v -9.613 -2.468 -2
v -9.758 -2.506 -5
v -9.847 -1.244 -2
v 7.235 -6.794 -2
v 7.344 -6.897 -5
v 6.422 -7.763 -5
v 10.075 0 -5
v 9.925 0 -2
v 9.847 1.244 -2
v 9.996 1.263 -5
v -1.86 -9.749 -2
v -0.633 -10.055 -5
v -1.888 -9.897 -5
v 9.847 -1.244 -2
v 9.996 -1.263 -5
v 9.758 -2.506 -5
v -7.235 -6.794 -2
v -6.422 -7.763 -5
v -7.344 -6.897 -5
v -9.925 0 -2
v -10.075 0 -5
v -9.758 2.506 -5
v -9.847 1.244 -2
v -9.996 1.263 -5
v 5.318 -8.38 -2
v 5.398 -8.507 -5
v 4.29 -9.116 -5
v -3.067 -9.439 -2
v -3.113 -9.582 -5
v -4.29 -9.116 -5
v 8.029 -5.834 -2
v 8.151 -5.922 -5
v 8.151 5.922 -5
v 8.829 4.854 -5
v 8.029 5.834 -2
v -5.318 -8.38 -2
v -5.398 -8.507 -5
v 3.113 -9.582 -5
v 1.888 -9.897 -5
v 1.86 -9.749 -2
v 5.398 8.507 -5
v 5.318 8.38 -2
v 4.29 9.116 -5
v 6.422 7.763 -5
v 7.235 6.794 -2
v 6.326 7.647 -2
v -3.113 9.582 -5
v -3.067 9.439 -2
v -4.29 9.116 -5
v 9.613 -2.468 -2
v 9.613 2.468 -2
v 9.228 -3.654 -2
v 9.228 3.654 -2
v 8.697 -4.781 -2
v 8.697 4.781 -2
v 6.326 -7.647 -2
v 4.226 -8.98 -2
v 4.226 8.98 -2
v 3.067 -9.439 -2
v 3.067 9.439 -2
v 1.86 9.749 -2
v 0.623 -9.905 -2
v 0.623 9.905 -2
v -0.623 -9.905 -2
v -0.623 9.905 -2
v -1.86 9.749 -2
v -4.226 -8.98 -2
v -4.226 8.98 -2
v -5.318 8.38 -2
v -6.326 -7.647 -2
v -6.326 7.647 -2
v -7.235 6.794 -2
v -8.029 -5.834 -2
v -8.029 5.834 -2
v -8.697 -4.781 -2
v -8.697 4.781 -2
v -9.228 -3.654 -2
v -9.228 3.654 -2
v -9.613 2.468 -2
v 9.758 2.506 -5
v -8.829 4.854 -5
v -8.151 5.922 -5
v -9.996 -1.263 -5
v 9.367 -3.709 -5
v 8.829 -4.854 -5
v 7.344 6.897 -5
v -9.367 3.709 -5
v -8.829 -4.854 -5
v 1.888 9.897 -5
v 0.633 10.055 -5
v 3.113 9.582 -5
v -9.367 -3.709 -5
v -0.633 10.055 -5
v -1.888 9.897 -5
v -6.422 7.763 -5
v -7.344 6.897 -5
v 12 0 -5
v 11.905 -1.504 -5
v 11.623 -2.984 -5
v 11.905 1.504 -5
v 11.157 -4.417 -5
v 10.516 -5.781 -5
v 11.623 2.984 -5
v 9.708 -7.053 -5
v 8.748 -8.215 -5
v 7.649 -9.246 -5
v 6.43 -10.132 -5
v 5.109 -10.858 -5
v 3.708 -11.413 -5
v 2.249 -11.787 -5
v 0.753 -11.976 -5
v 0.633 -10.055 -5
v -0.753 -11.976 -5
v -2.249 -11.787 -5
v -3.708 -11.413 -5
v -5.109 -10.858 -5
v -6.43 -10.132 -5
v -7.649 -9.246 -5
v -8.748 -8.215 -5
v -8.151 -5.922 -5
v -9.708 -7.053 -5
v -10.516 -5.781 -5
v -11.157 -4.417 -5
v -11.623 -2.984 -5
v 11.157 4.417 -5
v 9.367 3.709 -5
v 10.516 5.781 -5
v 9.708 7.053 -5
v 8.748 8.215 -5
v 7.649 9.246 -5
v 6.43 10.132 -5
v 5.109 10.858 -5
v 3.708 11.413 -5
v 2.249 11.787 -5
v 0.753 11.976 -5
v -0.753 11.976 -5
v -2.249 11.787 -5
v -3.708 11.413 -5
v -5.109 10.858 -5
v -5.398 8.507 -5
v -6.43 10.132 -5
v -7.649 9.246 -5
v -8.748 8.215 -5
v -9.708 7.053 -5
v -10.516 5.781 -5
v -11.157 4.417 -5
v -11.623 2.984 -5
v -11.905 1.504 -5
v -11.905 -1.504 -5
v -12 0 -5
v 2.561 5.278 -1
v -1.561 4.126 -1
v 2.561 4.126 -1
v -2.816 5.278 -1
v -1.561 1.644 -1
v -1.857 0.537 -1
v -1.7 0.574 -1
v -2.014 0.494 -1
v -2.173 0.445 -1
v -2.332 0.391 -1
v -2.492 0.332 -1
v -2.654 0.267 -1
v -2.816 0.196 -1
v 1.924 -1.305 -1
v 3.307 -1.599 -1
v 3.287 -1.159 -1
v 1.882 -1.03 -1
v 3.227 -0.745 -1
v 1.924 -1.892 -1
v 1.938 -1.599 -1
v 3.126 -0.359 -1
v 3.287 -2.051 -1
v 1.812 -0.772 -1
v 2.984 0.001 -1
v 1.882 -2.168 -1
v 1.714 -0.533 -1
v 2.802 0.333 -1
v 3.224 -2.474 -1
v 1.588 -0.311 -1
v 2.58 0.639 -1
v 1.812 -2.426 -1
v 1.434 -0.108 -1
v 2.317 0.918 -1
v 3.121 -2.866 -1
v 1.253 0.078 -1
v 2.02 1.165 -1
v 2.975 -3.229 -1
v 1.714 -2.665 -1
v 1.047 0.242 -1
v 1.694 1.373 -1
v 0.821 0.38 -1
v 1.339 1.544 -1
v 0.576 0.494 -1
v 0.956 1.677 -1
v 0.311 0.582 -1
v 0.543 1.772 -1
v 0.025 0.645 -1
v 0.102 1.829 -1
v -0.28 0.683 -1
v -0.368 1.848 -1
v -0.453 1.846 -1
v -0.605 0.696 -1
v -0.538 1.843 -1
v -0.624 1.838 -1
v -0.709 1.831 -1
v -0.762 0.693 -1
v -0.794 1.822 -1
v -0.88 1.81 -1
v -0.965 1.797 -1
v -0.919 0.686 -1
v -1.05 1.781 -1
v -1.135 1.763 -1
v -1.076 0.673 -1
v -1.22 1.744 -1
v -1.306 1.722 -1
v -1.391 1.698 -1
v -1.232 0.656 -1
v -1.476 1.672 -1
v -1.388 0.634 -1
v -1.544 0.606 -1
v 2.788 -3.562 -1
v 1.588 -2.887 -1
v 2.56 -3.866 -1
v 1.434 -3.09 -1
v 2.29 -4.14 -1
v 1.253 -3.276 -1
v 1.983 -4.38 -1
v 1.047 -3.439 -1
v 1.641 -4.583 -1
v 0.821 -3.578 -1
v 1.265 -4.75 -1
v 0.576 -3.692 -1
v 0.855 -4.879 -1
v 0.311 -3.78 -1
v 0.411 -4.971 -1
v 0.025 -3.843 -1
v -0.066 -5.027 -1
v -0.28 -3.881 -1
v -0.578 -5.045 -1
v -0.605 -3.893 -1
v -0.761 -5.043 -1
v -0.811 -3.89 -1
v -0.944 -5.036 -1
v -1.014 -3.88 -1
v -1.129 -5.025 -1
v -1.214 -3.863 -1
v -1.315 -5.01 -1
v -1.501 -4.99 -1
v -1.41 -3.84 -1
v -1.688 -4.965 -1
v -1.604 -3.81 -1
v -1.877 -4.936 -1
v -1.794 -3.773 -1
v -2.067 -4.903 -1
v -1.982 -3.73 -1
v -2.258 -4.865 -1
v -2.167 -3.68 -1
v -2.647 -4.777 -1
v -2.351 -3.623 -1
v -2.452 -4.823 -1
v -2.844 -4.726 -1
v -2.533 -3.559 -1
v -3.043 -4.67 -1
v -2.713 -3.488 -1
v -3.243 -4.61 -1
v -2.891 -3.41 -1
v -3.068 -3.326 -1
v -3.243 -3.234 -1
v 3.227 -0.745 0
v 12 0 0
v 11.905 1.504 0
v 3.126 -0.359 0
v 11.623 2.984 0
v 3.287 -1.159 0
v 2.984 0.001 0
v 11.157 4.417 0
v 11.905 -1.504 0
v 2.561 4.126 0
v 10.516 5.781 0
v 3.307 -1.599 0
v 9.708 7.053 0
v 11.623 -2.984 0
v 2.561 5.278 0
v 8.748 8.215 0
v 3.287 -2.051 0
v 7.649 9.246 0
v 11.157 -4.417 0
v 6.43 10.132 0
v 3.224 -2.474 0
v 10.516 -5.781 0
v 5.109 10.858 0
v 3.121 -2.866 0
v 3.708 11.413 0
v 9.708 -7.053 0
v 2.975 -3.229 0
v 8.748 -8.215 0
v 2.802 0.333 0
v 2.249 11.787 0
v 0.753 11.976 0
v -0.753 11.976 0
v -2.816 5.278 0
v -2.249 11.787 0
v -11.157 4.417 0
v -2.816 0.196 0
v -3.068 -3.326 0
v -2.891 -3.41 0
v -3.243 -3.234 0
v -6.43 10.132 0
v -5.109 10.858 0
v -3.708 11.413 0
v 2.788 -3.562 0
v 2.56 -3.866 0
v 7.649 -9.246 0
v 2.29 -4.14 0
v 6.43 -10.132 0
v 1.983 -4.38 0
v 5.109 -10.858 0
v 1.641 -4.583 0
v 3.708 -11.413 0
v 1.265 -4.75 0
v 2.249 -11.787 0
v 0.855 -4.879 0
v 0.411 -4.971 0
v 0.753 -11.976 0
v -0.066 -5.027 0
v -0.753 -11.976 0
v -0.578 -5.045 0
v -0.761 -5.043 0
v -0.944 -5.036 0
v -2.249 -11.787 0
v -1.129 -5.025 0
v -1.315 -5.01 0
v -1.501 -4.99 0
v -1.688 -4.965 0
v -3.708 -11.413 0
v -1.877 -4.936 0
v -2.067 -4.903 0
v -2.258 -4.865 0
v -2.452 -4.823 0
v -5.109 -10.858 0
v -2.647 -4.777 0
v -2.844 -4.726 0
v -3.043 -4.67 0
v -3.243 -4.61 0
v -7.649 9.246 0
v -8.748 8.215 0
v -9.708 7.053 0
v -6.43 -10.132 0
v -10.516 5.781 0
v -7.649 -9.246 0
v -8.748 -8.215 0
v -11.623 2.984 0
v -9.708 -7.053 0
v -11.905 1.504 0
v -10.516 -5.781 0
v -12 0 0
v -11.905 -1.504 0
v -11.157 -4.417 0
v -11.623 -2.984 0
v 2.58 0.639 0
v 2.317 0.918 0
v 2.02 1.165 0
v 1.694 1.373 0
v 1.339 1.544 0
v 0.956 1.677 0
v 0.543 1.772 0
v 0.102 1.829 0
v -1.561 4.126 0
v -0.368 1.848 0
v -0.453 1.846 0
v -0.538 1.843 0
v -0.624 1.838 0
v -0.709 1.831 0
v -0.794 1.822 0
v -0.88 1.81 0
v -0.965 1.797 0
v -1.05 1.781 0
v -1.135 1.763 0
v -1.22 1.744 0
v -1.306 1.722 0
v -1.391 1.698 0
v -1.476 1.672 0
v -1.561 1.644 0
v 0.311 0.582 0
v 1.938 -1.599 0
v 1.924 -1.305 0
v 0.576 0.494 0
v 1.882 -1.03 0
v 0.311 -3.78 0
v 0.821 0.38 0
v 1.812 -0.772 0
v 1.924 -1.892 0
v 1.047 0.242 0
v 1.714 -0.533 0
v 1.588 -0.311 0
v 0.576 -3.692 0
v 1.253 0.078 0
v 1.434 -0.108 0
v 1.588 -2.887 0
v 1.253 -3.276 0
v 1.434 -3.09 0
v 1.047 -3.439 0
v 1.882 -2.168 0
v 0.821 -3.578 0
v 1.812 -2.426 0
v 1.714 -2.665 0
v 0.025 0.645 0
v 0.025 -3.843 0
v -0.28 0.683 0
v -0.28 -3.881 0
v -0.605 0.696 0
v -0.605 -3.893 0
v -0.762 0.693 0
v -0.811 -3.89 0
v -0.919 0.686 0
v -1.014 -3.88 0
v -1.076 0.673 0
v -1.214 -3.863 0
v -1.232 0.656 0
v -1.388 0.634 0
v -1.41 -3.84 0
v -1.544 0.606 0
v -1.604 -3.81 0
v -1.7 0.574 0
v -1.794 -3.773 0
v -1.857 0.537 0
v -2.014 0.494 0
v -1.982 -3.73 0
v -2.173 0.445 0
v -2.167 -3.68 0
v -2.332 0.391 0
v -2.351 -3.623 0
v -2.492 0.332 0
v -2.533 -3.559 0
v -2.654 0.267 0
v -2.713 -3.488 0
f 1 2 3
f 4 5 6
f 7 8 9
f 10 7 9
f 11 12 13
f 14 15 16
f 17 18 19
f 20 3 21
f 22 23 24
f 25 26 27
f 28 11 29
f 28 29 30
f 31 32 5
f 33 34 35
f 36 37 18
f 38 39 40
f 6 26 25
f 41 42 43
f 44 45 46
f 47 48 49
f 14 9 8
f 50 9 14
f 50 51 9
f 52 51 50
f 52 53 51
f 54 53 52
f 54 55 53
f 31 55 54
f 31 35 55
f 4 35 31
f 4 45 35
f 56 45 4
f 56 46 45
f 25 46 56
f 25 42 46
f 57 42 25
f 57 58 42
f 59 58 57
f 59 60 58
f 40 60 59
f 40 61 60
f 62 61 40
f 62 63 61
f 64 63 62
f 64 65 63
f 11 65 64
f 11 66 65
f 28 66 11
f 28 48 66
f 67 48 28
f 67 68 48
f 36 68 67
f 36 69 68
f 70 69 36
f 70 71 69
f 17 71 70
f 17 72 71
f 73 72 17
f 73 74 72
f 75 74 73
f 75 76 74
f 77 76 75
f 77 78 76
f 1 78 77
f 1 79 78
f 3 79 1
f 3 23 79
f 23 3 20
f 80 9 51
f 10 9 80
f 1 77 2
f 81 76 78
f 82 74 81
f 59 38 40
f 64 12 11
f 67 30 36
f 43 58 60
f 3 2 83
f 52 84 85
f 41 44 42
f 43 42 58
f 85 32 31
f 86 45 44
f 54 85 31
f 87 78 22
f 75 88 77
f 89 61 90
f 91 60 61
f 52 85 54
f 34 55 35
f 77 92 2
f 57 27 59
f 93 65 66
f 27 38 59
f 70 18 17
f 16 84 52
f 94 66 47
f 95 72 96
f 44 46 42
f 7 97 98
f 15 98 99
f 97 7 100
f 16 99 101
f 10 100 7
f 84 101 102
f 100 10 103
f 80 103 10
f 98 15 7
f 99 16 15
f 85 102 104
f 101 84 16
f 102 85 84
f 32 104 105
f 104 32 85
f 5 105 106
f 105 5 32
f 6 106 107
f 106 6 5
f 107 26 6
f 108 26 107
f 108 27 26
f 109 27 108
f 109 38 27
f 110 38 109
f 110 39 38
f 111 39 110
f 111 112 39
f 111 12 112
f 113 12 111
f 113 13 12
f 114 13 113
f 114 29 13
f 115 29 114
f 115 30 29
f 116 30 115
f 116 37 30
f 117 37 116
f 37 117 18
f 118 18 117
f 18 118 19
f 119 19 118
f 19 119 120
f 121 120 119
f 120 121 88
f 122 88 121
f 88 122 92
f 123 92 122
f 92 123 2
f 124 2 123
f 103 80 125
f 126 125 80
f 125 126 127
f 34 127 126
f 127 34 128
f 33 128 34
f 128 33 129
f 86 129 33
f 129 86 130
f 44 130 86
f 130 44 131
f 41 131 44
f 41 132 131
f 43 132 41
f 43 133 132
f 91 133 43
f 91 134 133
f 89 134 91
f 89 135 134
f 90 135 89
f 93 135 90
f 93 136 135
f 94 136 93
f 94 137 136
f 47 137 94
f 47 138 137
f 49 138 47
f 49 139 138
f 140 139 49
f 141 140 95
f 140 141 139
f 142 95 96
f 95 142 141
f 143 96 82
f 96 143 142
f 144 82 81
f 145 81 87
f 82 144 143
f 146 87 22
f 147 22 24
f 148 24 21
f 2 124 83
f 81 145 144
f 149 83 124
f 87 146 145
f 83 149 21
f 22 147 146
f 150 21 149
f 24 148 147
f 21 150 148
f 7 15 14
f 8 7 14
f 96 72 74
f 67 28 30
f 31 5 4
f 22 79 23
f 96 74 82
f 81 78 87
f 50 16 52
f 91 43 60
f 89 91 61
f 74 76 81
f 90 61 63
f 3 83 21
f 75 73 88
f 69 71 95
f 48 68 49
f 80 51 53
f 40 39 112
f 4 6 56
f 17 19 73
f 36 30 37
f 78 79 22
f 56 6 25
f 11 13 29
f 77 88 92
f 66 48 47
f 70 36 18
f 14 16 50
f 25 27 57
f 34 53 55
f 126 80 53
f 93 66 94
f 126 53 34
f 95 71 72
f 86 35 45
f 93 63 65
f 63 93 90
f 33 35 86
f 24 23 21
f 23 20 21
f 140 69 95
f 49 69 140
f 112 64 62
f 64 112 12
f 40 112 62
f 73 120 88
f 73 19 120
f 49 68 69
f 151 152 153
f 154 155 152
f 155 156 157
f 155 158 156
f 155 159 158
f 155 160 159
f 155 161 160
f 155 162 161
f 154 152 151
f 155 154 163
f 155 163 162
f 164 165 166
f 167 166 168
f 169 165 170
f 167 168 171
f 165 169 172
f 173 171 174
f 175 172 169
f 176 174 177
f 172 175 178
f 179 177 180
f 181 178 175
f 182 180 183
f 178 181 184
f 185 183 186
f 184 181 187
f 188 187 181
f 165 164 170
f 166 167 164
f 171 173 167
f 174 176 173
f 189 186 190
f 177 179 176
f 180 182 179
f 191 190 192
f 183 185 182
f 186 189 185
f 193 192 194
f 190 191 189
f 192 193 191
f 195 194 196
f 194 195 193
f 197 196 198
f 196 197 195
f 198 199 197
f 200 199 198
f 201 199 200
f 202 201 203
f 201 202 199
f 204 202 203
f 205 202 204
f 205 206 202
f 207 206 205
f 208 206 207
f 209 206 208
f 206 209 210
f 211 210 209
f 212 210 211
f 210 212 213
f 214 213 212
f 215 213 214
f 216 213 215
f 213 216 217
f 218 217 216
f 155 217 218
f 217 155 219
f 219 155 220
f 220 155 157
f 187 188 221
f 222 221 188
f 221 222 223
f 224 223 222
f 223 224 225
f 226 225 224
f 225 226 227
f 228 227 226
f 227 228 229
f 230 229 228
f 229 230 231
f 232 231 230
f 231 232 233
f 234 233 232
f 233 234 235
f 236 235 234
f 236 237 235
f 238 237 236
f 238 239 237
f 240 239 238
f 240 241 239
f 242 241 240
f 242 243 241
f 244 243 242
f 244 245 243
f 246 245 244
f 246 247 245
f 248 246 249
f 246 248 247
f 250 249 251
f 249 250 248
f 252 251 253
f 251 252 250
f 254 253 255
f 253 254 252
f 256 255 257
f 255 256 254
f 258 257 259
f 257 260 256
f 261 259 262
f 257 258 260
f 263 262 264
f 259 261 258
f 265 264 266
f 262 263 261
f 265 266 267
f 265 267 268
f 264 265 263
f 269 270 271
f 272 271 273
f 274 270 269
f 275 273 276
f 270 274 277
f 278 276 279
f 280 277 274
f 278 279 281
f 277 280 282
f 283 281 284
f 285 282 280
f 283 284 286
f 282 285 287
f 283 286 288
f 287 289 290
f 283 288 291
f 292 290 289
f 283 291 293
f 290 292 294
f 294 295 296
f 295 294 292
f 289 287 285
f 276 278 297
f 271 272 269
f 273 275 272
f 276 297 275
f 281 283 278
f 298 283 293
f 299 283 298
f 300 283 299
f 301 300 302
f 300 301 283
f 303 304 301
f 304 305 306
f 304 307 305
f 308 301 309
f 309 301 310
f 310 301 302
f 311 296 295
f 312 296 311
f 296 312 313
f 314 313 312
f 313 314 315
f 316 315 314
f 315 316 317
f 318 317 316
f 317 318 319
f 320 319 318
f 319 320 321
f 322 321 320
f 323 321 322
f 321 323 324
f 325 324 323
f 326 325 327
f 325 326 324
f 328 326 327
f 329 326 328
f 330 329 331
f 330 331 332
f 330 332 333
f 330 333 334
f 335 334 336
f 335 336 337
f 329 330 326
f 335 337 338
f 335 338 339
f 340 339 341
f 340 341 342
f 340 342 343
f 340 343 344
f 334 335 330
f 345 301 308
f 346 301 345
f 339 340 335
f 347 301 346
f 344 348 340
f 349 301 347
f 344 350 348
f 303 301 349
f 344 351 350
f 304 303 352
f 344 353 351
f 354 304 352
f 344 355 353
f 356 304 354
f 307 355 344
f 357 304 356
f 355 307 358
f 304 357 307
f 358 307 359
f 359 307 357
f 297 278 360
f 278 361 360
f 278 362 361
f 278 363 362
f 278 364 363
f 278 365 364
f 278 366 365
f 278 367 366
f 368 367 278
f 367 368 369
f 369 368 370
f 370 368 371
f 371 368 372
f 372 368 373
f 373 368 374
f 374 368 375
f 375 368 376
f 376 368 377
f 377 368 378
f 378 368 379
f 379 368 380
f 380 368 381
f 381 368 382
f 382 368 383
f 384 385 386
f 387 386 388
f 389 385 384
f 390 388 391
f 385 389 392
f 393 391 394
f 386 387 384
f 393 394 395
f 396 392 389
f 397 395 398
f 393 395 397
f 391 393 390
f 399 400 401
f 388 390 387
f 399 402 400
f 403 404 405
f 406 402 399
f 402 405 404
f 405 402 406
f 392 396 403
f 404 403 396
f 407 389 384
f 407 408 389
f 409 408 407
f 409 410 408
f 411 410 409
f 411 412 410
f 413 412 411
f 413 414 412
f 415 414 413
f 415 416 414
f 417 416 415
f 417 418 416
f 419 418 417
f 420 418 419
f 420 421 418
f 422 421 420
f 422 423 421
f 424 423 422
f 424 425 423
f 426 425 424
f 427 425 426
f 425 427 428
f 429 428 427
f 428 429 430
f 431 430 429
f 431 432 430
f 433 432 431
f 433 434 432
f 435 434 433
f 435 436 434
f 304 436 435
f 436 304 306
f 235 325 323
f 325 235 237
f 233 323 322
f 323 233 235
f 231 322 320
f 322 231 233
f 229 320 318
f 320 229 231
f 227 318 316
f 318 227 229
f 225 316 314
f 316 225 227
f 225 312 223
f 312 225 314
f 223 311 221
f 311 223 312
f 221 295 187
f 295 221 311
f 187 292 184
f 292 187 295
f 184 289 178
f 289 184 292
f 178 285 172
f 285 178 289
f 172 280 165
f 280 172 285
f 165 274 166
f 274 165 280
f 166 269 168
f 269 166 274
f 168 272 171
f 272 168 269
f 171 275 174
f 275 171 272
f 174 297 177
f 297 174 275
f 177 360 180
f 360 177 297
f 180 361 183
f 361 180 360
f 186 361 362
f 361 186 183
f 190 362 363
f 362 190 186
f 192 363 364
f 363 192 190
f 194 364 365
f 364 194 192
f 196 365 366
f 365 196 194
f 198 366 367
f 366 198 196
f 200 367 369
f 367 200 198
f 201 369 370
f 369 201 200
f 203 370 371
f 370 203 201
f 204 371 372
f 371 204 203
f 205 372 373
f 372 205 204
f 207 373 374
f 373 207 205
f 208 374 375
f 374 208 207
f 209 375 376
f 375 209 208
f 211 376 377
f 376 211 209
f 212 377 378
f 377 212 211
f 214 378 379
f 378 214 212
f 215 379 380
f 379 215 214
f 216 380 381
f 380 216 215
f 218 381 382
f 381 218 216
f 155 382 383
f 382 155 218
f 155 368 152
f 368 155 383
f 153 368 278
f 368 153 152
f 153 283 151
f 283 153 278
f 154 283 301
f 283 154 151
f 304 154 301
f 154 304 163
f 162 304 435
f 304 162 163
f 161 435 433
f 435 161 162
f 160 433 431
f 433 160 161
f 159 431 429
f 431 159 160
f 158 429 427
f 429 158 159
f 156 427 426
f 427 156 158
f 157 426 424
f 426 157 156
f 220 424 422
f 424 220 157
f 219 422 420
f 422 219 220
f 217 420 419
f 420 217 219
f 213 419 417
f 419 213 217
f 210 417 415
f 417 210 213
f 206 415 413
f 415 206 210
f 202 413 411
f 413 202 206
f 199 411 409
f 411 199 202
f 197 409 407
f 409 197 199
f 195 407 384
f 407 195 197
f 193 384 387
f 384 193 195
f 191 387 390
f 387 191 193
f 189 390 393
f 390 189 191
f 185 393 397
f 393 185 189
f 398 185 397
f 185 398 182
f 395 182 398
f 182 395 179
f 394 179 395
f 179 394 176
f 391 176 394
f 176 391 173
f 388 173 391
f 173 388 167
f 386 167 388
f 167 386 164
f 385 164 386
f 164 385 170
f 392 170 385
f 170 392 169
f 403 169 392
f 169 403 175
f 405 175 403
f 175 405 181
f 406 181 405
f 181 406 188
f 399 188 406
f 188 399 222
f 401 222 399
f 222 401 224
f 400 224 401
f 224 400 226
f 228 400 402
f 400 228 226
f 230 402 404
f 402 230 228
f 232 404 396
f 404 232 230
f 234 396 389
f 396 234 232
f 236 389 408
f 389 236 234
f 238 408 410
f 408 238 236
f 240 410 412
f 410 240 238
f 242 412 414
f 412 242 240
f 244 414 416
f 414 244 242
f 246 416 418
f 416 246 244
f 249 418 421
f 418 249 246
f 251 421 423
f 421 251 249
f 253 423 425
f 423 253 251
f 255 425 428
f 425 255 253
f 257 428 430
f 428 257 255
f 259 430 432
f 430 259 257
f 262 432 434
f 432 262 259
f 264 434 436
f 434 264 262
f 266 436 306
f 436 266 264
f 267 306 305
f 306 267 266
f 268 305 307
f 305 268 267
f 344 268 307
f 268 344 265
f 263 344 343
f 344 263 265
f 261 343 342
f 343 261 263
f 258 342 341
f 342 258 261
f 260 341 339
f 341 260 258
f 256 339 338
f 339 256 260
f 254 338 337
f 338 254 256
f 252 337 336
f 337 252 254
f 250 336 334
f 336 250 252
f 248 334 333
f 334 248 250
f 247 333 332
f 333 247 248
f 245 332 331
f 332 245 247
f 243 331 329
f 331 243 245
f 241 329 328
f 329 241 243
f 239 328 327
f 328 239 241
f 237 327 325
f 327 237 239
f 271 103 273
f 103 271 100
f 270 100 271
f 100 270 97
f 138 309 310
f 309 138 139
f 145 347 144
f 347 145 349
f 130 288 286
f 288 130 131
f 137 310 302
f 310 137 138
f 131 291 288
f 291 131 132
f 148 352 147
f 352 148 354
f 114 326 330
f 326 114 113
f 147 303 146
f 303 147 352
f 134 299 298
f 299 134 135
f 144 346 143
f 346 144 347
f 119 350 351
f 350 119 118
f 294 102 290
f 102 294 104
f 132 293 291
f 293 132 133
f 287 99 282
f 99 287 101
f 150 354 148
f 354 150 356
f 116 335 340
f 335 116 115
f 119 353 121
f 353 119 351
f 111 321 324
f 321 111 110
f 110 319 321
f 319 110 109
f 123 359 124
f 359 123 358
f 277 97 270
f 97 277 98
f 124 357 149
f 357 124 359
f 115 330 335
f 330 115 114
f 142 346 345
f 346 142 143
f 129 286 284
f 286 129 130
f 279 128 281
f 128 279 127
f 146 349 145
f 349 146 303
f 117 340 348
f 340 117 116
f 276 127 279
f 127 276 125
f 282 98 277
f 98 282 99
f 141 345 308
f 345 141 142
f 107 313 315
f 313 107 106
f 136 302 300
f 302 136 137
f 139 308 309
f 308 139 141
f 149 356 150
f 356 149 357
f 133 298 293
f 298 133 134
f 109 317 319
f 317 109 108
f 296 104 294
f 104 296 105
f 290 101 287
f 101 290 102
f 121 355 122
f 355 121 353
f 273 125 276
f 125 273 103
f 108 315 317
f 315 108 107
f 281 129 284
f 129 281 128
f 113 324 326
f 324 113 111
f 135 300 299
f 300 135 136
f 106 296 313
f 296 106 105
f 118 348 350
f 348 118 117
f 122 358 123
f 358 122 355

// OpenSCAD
$fn = 50;


difference() {
	union() {
		translate(v = [0, 0, -5.0000000000]) {
			cylinder(h = 5, r = 12.0000000000);
		}
	}
	union() {
		#translate(v = [0, 0, -5.0000000000]) {
			cylinder(h = 3, r1 = 10.0750000000, r2 = 9.9250000000);
		}
		translate(v = [0, 0, -1]) {
			linear_extrude(height = 1) {
				text(font = "Impact", halign = "center", size = 10, text = "5", valign = "center");
			}
		}
	}
}
